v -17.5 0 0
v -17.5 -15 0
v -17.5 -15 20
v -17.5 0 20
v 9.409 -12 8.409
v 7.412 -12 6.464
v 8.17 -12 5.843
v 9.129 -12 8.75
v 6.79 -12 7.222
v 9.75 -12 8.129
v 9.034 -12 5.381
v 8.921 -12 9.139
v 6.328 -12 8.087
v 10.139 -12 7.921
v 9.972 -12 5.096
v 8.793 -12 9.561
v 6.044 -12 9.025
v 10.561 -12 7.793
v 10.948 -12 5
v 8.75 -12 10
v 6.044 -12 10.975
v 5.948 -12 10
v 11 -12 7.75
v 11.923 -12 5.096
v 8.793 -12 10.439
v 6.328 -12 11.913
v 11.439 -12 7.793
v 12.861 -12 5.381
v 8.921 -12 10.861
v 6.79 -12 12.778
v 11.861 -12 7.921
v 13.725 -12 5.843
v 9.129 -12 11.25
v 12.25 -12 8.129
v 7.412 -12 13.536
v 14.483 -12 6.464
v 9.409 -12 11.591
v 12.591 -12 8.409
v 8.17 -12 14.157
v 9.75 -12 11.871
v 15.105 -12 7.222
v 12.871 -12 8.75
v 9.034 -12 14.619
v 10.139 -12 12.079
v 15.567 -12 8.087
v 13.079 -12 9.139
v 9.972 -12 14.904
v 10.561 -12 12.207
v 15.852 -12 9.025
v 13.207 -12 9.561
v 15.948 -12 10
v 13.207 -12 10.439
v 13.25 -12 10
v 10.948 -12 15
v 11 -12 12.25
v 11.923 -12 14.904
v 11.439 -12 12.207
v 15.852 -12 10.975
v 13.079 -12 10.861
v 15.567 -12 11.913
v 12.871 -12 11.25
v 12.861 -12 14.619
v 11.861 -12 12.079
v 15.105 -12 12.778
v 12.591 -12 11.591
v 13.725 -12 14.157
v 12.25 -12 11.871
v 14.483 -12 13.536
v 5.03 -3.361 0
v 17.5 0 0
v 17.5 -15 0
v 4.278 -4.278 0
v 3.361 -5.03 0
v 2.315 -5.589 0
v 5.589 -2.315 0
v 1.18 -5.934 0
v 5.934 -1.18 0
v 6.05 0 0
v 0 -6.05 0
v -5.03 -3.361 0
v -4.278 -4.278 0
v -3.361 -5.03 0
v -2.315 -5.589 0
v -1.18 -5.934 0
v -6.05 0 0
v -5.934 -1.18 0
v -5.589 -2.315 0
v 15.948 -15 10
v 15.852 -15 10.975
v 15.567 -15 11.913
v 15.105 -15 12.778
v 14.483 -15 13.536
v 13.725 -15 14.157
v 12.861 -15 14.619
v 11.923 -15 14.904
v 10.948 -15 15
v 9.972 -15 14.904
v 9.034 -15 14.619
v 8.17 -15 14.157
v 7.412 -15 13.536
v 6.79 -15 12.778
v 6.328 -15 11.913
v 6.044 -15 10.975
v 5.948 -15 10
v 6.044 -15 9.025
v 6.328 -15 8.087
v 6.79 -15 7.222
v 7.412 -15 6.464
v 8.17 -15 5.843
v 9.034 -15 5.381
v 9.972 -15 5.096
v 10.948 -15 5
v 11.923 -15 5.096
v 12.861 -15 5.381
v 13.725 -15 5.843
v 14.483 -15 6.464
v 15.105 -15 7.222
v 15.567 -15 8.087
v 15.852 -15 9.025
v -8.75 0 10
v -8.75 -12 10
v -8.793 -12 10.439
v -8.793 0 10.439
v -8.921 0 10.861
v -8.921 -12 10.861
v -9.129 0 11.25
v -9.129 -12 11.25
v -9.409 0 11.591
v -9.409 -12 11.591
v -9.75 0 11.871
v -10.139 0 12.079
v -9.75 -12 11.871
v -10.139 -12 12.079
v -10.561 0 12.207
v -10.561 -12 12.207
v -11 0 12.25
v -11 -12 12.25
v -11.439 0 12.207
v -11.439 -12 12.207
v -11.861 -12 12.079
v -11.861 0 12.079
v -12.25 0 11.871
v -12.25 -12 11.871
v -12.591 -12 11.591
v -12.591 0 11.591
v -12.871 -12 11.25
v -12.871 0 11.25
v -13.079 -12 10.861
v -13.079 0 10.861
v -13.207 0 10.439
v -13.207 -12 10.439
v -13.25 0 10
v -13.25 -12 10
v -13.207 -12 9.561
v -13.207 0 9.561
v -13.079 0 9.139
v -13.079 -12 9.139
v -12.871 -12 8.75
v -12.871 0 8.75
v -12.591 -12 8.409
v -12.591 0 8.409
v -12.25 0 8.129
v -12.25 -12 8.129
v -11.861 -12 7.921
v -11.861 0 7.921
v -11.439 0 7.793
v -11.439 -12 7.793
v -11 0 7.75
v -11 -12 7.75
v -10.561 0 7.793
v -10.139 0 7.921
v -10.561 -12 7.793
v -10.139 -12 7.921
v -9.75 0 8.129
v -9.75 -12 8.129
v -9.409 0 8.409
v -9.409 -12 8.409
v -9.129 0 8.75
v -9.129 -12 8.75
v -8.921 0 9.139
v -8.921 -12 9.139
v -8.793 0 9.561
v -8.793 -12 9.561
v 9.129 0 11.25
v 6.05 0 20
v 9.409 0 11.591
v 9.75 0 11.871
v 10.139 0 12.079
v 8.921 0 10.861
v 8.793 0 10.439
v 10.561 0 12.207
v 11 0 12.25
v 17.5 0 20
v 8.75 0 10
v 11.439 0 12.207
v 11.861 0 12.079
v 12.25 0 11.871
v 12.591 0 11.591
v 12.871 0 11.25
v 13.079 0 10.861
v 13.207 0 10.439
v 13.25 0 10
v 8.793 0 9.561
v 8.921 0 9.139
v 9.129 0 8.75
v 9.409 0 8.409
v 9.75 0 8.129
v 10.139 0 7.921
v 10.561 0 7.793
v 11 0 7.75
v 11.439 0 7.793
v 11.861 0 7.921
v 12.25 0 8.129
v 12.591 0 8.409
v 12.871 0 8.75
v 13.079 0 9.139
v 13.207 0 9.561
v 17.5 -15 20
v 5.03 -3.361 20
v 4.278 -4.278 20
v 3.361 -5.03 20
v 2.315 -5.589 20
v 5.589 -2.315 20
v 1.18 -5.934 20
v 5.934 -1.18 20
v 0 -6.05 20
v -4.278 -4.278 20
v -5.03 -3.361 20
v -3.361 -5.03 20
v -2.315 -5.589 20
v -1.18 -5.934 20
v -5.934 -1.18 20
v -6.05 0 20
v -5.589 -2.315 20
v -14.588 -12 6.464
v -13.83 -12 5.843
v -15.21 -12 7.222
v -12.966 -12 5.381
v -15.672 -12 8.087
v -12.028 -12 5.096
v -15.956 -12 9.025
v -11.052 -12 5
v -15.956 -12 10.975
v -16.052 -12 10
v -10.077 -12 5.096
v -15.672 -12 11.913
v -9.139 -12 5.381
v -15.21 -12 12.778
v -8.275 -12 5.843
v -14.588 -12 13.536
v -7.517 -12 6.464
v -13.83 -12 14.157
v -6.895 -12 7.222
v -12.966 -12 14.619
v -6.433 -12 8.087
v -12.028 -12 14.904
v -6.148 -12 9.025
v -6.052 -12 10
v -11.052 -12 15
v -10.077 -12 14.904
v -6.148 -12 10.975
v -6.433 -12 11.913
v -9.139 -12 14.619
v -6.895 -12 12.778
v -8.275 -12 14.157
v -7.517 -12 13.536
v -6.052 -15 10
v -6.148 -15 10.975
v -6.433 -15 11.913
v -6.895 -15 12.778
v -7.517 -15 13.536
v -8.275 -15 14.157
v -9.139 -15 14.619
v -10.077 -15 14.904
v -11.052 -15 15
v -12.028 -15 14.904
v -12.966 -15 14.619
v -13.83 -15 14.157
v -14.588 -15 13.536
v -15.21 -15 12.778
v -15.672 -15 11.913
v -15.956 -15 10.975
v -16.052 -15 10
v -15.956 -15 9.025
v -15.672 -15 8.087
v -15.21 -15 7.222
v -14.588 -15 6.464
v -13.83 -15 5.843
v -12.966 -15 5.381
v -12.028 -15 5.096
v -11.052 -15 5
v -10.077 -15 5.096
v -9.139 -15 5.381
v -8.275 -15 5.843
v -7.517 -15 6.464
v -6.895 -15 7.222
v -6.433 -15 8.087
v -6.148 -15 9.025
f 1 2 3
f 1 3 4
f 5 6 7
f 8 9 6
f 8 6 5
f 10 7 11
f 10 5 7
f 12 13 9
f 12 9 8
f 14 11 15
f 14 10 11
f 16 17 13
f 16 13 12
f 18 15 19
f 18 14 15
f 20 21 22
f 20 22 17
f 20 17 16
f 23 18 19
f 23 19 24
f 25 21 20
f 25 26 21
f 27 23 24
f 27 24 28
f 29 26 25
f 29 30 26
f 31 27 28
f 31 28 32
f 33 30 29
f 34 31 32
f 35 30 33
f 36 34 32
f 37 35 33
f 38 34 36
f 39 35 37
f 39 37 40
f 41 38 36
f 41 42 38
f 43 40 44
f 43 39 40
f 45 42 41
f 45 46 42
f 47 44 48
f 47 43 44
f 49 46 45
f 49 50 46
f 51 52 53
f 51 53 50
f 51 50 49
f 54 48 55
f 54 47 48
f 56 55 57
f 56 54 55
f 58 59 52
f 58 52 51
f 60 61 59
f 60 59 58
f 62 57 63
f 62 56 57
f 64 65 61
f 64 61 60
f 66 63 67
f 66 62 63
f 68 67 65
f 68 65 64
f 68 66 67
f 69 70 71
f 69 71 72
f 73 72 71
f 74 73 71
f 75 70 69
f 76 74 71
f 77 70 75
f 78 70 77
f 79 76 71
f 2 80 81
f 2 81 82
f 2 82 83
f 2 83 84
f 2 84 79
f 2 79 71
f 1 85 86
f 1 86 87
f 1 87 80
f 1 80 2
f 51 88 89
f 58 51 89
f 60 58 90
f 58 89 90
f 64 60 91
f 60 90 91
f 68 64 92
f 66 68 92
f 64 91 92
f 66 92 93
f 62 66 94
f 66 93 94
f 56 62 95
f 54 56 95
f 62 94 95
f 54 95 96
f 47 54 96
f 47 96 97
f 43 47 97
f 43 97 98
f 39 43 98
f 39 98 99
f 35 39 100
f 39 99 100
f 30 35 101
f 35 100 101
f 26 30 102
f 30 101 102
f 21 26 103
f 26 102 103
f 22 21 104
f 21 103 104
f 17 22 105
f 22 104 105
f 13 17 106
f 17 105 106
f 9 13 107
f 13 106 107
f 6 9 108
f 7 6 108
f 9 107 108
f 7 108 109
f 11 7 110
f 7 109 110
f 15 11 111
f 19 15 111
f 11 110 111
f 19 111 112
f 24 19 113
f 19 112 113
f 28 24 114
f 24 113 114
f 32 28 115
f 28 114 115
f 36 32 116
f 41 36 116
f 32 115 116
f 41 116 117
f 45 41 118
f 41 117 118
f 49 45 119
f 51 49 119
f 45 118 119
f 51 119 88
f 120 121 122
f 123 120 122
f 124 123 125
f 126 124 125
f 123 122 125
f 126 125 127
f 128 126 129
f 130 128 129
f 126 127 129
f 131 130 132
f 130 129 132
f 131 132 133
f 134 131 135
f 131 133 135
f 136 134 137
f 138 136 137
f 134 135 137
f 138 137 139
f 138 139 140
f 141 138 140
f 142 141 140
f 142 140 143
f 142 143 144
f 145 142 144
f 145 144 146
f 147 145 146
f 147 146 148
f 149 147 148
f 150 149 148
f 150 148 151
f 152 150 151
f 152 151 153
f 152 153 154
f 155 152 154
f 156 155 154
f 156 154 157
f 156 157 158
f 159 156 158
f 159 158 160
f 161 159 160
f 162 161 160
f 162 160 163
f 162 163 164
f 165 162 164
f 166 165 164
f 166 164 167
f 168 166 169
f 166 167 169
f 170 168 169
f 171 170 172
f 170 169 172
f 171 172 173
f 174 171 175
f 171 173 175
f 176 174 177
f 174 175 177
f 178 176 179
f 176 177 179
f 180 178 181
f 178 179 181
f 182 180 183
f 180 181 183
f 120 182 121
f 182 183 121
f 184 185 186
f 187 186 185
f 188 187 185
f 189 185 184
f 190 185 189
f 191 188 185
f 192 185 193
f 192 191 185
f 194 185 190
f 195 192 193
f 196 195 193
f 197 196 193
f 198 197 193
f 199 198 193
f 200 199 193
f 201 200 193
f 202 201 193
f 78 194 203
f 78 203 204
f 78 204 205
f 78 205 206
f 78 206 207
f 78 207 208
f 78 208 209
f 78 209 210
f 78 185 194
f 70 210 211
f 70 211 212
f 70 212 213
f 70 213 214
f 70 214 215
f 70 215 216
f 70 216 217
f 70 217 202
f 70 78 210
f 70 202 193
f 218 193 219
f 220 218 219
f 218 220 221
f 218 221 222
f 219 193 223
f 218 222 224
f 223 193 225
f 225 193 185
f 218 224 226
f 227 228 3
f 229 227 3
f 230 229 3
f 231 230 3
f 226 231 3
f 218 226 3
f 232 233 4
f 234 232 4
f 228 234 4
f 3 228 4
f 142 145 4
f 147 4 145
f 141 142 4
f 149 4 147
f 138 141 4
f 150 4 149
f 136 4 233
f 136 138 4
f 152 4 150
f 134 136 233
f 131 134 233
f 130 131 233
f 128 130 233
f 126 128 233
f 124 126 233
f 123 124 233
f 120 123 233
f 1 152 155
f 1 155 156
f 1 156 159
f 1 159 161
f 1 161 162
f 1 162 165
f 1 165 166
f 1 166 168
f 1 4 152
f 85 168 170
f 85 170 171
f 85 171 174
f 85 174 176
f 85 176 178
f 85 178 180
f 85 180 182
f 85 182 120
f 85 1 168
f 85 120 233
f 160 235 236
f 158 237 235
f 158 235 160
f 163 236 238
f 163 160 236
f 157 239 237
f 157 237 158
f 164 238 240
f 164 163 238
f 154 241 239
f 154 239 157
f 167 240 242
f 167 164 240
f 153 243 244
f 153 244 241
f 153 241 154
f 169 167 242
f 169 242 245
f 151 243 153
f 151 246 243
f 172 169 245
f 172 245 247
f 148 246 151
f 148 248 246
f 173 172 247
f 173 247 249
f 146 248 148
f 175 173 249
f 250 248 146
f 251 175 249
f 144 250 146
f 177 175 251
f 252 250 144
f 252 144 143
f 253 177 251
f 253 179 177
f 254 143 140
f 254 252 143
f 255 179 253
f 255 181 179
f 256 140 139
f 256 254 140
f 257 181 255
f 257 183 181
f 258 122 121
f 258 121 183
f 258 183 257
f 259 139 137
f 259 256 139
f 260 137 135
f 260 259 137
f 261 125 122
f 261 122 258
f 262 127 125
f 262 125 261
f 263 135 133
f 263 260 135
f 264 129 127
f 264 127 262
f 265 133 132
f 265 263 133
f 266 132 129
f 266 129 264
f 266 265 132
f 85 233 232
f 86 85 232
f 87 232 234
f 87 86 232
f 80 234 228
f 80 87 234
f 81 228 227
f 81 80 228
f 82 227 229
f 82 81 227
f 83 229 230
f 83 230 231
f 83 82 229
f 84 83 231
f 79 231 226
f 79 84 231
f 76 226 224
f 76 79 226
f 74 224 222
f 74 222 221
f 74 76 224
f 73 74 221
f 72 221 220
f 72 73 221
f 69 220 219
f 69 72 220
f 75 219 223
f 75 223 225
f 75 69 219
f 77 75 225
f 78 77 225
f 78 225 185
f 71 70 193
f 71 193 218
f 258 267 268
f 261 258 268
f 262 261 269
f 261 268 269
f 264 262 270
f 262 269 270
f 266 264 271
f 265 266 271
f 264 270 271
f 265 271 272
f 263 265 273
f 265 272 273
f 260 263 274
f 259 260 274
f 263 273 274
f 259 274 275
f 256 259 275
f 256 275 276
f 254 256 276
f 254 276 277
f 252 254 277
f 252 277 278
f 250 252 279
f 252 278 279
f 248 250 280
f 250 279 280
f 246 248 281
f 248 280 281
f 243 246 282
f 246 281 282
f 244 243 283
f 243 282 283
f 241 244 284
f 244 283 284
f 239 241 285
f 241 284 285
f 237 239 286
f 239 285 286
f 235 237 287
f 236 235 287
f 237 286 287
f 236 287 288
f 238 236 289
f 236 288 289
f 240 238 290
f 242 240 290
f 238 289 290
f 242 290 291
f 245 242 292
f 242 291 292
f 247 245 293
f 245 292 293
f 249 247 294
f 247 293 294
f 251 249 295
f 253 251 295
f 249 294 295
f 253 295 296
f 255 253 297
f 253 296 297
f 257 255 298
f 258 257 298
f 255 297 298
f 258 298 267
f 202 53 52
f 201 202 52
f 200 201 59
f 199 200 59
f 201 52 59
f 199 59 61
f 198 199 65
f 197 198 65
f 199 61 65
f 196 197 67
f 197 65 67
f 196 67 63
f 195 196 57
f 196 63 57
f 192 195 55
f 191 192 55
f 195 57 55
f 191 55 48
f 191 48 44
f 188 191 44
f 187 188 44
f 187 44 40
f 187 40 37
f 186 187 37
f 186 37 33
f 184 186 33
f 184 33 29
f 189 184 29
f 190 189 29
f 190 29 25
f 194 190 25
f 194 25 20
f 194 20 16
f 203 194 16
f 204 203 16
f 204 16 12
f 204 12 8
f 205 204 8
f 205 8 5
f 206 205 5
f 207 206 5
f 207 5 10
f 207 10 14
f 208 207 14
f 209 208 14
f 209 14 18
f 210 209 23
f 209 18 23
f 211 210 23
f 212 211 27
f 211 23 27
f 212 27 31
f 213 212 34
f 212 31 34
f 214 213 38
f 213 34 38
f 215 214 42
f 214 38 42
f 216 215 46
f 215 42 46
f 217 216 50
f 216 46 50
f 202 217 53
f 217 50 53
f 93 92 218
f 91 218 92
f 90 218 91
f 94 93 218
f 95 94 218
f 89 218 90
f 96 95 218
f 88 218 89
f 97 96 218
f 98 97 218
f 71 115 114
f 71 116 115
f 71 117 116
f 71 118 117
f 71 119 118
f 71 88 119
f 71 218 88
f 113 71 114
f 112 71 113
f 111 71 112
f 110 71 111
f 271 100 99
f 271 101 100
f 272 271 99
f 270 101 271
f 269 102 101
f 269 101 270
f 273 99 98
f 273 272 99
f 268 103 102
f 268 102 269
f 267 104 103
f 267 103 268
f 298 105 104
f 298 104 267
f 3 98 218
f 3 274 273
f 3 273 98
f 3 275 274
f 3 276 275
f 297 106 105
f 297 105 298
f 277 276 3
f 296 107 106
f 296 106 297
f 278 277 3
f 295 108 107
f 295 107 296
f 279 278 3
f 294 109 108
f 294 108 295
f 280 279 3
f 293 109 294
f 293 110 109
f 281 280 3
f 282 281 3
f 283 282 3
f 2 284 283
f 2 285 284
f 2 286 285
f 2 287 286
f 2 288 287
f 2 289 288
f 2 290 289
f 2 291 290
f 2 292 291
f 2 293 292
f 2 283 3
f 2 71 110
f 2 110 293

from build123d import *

# Parameters (mm, degrees)
PAD_DEPTH       = 20
SKETCH001_R     = 2.25
POCKET_DEPTH    = 15.001
SKETCH002_R     = 5
POCKET001_DEPTH = 3


with BuildPart() as part:
    # Sketch → Pad (new body)
    with BuildSketch(Plane.XY):
        with BuildLine():
            ThreePointArc((-6.05, 0), (0, -6.05), (6.05, 0))
            Line((6.05, 0), (17.5, 0))
            Line((17.5, 0), (17.5, -15))
            Line((17.5, -15), (-17.5, -15))
            Line((-17.5, -15), (-17.5, 0))
            Line((-17.5, 0), (-6.05, 0))
        make_face()
    extrude(amount=PAD_DEPTH)

    # Sketch001 → Pocket (cut, through all)
    with BuildSketch(Plane.XZ.offset(15)):
        with Locations((-11, 10)):
            Circle(SKETCH001_R)
        with Locations((11, 10)):
            Circle(SKETCH001_R)
    extrude(amount=-POCKET_DEPTH, mode=Mode.SUBTRACT)

    # Sketch002 → Pocket001 (cut)
    with BuildSketch(Plane.XZ.offset(15)):
        with Locations((-11.052364, 10)):
            Circle(SKETCH002_R)
        with Locations((10.947636, 10)):
            Circle(SKETCH002_R)
    extrude(amount=-POCKET001_DEPTH, mode=Mode.SUBTRACT)


solid = part.part
